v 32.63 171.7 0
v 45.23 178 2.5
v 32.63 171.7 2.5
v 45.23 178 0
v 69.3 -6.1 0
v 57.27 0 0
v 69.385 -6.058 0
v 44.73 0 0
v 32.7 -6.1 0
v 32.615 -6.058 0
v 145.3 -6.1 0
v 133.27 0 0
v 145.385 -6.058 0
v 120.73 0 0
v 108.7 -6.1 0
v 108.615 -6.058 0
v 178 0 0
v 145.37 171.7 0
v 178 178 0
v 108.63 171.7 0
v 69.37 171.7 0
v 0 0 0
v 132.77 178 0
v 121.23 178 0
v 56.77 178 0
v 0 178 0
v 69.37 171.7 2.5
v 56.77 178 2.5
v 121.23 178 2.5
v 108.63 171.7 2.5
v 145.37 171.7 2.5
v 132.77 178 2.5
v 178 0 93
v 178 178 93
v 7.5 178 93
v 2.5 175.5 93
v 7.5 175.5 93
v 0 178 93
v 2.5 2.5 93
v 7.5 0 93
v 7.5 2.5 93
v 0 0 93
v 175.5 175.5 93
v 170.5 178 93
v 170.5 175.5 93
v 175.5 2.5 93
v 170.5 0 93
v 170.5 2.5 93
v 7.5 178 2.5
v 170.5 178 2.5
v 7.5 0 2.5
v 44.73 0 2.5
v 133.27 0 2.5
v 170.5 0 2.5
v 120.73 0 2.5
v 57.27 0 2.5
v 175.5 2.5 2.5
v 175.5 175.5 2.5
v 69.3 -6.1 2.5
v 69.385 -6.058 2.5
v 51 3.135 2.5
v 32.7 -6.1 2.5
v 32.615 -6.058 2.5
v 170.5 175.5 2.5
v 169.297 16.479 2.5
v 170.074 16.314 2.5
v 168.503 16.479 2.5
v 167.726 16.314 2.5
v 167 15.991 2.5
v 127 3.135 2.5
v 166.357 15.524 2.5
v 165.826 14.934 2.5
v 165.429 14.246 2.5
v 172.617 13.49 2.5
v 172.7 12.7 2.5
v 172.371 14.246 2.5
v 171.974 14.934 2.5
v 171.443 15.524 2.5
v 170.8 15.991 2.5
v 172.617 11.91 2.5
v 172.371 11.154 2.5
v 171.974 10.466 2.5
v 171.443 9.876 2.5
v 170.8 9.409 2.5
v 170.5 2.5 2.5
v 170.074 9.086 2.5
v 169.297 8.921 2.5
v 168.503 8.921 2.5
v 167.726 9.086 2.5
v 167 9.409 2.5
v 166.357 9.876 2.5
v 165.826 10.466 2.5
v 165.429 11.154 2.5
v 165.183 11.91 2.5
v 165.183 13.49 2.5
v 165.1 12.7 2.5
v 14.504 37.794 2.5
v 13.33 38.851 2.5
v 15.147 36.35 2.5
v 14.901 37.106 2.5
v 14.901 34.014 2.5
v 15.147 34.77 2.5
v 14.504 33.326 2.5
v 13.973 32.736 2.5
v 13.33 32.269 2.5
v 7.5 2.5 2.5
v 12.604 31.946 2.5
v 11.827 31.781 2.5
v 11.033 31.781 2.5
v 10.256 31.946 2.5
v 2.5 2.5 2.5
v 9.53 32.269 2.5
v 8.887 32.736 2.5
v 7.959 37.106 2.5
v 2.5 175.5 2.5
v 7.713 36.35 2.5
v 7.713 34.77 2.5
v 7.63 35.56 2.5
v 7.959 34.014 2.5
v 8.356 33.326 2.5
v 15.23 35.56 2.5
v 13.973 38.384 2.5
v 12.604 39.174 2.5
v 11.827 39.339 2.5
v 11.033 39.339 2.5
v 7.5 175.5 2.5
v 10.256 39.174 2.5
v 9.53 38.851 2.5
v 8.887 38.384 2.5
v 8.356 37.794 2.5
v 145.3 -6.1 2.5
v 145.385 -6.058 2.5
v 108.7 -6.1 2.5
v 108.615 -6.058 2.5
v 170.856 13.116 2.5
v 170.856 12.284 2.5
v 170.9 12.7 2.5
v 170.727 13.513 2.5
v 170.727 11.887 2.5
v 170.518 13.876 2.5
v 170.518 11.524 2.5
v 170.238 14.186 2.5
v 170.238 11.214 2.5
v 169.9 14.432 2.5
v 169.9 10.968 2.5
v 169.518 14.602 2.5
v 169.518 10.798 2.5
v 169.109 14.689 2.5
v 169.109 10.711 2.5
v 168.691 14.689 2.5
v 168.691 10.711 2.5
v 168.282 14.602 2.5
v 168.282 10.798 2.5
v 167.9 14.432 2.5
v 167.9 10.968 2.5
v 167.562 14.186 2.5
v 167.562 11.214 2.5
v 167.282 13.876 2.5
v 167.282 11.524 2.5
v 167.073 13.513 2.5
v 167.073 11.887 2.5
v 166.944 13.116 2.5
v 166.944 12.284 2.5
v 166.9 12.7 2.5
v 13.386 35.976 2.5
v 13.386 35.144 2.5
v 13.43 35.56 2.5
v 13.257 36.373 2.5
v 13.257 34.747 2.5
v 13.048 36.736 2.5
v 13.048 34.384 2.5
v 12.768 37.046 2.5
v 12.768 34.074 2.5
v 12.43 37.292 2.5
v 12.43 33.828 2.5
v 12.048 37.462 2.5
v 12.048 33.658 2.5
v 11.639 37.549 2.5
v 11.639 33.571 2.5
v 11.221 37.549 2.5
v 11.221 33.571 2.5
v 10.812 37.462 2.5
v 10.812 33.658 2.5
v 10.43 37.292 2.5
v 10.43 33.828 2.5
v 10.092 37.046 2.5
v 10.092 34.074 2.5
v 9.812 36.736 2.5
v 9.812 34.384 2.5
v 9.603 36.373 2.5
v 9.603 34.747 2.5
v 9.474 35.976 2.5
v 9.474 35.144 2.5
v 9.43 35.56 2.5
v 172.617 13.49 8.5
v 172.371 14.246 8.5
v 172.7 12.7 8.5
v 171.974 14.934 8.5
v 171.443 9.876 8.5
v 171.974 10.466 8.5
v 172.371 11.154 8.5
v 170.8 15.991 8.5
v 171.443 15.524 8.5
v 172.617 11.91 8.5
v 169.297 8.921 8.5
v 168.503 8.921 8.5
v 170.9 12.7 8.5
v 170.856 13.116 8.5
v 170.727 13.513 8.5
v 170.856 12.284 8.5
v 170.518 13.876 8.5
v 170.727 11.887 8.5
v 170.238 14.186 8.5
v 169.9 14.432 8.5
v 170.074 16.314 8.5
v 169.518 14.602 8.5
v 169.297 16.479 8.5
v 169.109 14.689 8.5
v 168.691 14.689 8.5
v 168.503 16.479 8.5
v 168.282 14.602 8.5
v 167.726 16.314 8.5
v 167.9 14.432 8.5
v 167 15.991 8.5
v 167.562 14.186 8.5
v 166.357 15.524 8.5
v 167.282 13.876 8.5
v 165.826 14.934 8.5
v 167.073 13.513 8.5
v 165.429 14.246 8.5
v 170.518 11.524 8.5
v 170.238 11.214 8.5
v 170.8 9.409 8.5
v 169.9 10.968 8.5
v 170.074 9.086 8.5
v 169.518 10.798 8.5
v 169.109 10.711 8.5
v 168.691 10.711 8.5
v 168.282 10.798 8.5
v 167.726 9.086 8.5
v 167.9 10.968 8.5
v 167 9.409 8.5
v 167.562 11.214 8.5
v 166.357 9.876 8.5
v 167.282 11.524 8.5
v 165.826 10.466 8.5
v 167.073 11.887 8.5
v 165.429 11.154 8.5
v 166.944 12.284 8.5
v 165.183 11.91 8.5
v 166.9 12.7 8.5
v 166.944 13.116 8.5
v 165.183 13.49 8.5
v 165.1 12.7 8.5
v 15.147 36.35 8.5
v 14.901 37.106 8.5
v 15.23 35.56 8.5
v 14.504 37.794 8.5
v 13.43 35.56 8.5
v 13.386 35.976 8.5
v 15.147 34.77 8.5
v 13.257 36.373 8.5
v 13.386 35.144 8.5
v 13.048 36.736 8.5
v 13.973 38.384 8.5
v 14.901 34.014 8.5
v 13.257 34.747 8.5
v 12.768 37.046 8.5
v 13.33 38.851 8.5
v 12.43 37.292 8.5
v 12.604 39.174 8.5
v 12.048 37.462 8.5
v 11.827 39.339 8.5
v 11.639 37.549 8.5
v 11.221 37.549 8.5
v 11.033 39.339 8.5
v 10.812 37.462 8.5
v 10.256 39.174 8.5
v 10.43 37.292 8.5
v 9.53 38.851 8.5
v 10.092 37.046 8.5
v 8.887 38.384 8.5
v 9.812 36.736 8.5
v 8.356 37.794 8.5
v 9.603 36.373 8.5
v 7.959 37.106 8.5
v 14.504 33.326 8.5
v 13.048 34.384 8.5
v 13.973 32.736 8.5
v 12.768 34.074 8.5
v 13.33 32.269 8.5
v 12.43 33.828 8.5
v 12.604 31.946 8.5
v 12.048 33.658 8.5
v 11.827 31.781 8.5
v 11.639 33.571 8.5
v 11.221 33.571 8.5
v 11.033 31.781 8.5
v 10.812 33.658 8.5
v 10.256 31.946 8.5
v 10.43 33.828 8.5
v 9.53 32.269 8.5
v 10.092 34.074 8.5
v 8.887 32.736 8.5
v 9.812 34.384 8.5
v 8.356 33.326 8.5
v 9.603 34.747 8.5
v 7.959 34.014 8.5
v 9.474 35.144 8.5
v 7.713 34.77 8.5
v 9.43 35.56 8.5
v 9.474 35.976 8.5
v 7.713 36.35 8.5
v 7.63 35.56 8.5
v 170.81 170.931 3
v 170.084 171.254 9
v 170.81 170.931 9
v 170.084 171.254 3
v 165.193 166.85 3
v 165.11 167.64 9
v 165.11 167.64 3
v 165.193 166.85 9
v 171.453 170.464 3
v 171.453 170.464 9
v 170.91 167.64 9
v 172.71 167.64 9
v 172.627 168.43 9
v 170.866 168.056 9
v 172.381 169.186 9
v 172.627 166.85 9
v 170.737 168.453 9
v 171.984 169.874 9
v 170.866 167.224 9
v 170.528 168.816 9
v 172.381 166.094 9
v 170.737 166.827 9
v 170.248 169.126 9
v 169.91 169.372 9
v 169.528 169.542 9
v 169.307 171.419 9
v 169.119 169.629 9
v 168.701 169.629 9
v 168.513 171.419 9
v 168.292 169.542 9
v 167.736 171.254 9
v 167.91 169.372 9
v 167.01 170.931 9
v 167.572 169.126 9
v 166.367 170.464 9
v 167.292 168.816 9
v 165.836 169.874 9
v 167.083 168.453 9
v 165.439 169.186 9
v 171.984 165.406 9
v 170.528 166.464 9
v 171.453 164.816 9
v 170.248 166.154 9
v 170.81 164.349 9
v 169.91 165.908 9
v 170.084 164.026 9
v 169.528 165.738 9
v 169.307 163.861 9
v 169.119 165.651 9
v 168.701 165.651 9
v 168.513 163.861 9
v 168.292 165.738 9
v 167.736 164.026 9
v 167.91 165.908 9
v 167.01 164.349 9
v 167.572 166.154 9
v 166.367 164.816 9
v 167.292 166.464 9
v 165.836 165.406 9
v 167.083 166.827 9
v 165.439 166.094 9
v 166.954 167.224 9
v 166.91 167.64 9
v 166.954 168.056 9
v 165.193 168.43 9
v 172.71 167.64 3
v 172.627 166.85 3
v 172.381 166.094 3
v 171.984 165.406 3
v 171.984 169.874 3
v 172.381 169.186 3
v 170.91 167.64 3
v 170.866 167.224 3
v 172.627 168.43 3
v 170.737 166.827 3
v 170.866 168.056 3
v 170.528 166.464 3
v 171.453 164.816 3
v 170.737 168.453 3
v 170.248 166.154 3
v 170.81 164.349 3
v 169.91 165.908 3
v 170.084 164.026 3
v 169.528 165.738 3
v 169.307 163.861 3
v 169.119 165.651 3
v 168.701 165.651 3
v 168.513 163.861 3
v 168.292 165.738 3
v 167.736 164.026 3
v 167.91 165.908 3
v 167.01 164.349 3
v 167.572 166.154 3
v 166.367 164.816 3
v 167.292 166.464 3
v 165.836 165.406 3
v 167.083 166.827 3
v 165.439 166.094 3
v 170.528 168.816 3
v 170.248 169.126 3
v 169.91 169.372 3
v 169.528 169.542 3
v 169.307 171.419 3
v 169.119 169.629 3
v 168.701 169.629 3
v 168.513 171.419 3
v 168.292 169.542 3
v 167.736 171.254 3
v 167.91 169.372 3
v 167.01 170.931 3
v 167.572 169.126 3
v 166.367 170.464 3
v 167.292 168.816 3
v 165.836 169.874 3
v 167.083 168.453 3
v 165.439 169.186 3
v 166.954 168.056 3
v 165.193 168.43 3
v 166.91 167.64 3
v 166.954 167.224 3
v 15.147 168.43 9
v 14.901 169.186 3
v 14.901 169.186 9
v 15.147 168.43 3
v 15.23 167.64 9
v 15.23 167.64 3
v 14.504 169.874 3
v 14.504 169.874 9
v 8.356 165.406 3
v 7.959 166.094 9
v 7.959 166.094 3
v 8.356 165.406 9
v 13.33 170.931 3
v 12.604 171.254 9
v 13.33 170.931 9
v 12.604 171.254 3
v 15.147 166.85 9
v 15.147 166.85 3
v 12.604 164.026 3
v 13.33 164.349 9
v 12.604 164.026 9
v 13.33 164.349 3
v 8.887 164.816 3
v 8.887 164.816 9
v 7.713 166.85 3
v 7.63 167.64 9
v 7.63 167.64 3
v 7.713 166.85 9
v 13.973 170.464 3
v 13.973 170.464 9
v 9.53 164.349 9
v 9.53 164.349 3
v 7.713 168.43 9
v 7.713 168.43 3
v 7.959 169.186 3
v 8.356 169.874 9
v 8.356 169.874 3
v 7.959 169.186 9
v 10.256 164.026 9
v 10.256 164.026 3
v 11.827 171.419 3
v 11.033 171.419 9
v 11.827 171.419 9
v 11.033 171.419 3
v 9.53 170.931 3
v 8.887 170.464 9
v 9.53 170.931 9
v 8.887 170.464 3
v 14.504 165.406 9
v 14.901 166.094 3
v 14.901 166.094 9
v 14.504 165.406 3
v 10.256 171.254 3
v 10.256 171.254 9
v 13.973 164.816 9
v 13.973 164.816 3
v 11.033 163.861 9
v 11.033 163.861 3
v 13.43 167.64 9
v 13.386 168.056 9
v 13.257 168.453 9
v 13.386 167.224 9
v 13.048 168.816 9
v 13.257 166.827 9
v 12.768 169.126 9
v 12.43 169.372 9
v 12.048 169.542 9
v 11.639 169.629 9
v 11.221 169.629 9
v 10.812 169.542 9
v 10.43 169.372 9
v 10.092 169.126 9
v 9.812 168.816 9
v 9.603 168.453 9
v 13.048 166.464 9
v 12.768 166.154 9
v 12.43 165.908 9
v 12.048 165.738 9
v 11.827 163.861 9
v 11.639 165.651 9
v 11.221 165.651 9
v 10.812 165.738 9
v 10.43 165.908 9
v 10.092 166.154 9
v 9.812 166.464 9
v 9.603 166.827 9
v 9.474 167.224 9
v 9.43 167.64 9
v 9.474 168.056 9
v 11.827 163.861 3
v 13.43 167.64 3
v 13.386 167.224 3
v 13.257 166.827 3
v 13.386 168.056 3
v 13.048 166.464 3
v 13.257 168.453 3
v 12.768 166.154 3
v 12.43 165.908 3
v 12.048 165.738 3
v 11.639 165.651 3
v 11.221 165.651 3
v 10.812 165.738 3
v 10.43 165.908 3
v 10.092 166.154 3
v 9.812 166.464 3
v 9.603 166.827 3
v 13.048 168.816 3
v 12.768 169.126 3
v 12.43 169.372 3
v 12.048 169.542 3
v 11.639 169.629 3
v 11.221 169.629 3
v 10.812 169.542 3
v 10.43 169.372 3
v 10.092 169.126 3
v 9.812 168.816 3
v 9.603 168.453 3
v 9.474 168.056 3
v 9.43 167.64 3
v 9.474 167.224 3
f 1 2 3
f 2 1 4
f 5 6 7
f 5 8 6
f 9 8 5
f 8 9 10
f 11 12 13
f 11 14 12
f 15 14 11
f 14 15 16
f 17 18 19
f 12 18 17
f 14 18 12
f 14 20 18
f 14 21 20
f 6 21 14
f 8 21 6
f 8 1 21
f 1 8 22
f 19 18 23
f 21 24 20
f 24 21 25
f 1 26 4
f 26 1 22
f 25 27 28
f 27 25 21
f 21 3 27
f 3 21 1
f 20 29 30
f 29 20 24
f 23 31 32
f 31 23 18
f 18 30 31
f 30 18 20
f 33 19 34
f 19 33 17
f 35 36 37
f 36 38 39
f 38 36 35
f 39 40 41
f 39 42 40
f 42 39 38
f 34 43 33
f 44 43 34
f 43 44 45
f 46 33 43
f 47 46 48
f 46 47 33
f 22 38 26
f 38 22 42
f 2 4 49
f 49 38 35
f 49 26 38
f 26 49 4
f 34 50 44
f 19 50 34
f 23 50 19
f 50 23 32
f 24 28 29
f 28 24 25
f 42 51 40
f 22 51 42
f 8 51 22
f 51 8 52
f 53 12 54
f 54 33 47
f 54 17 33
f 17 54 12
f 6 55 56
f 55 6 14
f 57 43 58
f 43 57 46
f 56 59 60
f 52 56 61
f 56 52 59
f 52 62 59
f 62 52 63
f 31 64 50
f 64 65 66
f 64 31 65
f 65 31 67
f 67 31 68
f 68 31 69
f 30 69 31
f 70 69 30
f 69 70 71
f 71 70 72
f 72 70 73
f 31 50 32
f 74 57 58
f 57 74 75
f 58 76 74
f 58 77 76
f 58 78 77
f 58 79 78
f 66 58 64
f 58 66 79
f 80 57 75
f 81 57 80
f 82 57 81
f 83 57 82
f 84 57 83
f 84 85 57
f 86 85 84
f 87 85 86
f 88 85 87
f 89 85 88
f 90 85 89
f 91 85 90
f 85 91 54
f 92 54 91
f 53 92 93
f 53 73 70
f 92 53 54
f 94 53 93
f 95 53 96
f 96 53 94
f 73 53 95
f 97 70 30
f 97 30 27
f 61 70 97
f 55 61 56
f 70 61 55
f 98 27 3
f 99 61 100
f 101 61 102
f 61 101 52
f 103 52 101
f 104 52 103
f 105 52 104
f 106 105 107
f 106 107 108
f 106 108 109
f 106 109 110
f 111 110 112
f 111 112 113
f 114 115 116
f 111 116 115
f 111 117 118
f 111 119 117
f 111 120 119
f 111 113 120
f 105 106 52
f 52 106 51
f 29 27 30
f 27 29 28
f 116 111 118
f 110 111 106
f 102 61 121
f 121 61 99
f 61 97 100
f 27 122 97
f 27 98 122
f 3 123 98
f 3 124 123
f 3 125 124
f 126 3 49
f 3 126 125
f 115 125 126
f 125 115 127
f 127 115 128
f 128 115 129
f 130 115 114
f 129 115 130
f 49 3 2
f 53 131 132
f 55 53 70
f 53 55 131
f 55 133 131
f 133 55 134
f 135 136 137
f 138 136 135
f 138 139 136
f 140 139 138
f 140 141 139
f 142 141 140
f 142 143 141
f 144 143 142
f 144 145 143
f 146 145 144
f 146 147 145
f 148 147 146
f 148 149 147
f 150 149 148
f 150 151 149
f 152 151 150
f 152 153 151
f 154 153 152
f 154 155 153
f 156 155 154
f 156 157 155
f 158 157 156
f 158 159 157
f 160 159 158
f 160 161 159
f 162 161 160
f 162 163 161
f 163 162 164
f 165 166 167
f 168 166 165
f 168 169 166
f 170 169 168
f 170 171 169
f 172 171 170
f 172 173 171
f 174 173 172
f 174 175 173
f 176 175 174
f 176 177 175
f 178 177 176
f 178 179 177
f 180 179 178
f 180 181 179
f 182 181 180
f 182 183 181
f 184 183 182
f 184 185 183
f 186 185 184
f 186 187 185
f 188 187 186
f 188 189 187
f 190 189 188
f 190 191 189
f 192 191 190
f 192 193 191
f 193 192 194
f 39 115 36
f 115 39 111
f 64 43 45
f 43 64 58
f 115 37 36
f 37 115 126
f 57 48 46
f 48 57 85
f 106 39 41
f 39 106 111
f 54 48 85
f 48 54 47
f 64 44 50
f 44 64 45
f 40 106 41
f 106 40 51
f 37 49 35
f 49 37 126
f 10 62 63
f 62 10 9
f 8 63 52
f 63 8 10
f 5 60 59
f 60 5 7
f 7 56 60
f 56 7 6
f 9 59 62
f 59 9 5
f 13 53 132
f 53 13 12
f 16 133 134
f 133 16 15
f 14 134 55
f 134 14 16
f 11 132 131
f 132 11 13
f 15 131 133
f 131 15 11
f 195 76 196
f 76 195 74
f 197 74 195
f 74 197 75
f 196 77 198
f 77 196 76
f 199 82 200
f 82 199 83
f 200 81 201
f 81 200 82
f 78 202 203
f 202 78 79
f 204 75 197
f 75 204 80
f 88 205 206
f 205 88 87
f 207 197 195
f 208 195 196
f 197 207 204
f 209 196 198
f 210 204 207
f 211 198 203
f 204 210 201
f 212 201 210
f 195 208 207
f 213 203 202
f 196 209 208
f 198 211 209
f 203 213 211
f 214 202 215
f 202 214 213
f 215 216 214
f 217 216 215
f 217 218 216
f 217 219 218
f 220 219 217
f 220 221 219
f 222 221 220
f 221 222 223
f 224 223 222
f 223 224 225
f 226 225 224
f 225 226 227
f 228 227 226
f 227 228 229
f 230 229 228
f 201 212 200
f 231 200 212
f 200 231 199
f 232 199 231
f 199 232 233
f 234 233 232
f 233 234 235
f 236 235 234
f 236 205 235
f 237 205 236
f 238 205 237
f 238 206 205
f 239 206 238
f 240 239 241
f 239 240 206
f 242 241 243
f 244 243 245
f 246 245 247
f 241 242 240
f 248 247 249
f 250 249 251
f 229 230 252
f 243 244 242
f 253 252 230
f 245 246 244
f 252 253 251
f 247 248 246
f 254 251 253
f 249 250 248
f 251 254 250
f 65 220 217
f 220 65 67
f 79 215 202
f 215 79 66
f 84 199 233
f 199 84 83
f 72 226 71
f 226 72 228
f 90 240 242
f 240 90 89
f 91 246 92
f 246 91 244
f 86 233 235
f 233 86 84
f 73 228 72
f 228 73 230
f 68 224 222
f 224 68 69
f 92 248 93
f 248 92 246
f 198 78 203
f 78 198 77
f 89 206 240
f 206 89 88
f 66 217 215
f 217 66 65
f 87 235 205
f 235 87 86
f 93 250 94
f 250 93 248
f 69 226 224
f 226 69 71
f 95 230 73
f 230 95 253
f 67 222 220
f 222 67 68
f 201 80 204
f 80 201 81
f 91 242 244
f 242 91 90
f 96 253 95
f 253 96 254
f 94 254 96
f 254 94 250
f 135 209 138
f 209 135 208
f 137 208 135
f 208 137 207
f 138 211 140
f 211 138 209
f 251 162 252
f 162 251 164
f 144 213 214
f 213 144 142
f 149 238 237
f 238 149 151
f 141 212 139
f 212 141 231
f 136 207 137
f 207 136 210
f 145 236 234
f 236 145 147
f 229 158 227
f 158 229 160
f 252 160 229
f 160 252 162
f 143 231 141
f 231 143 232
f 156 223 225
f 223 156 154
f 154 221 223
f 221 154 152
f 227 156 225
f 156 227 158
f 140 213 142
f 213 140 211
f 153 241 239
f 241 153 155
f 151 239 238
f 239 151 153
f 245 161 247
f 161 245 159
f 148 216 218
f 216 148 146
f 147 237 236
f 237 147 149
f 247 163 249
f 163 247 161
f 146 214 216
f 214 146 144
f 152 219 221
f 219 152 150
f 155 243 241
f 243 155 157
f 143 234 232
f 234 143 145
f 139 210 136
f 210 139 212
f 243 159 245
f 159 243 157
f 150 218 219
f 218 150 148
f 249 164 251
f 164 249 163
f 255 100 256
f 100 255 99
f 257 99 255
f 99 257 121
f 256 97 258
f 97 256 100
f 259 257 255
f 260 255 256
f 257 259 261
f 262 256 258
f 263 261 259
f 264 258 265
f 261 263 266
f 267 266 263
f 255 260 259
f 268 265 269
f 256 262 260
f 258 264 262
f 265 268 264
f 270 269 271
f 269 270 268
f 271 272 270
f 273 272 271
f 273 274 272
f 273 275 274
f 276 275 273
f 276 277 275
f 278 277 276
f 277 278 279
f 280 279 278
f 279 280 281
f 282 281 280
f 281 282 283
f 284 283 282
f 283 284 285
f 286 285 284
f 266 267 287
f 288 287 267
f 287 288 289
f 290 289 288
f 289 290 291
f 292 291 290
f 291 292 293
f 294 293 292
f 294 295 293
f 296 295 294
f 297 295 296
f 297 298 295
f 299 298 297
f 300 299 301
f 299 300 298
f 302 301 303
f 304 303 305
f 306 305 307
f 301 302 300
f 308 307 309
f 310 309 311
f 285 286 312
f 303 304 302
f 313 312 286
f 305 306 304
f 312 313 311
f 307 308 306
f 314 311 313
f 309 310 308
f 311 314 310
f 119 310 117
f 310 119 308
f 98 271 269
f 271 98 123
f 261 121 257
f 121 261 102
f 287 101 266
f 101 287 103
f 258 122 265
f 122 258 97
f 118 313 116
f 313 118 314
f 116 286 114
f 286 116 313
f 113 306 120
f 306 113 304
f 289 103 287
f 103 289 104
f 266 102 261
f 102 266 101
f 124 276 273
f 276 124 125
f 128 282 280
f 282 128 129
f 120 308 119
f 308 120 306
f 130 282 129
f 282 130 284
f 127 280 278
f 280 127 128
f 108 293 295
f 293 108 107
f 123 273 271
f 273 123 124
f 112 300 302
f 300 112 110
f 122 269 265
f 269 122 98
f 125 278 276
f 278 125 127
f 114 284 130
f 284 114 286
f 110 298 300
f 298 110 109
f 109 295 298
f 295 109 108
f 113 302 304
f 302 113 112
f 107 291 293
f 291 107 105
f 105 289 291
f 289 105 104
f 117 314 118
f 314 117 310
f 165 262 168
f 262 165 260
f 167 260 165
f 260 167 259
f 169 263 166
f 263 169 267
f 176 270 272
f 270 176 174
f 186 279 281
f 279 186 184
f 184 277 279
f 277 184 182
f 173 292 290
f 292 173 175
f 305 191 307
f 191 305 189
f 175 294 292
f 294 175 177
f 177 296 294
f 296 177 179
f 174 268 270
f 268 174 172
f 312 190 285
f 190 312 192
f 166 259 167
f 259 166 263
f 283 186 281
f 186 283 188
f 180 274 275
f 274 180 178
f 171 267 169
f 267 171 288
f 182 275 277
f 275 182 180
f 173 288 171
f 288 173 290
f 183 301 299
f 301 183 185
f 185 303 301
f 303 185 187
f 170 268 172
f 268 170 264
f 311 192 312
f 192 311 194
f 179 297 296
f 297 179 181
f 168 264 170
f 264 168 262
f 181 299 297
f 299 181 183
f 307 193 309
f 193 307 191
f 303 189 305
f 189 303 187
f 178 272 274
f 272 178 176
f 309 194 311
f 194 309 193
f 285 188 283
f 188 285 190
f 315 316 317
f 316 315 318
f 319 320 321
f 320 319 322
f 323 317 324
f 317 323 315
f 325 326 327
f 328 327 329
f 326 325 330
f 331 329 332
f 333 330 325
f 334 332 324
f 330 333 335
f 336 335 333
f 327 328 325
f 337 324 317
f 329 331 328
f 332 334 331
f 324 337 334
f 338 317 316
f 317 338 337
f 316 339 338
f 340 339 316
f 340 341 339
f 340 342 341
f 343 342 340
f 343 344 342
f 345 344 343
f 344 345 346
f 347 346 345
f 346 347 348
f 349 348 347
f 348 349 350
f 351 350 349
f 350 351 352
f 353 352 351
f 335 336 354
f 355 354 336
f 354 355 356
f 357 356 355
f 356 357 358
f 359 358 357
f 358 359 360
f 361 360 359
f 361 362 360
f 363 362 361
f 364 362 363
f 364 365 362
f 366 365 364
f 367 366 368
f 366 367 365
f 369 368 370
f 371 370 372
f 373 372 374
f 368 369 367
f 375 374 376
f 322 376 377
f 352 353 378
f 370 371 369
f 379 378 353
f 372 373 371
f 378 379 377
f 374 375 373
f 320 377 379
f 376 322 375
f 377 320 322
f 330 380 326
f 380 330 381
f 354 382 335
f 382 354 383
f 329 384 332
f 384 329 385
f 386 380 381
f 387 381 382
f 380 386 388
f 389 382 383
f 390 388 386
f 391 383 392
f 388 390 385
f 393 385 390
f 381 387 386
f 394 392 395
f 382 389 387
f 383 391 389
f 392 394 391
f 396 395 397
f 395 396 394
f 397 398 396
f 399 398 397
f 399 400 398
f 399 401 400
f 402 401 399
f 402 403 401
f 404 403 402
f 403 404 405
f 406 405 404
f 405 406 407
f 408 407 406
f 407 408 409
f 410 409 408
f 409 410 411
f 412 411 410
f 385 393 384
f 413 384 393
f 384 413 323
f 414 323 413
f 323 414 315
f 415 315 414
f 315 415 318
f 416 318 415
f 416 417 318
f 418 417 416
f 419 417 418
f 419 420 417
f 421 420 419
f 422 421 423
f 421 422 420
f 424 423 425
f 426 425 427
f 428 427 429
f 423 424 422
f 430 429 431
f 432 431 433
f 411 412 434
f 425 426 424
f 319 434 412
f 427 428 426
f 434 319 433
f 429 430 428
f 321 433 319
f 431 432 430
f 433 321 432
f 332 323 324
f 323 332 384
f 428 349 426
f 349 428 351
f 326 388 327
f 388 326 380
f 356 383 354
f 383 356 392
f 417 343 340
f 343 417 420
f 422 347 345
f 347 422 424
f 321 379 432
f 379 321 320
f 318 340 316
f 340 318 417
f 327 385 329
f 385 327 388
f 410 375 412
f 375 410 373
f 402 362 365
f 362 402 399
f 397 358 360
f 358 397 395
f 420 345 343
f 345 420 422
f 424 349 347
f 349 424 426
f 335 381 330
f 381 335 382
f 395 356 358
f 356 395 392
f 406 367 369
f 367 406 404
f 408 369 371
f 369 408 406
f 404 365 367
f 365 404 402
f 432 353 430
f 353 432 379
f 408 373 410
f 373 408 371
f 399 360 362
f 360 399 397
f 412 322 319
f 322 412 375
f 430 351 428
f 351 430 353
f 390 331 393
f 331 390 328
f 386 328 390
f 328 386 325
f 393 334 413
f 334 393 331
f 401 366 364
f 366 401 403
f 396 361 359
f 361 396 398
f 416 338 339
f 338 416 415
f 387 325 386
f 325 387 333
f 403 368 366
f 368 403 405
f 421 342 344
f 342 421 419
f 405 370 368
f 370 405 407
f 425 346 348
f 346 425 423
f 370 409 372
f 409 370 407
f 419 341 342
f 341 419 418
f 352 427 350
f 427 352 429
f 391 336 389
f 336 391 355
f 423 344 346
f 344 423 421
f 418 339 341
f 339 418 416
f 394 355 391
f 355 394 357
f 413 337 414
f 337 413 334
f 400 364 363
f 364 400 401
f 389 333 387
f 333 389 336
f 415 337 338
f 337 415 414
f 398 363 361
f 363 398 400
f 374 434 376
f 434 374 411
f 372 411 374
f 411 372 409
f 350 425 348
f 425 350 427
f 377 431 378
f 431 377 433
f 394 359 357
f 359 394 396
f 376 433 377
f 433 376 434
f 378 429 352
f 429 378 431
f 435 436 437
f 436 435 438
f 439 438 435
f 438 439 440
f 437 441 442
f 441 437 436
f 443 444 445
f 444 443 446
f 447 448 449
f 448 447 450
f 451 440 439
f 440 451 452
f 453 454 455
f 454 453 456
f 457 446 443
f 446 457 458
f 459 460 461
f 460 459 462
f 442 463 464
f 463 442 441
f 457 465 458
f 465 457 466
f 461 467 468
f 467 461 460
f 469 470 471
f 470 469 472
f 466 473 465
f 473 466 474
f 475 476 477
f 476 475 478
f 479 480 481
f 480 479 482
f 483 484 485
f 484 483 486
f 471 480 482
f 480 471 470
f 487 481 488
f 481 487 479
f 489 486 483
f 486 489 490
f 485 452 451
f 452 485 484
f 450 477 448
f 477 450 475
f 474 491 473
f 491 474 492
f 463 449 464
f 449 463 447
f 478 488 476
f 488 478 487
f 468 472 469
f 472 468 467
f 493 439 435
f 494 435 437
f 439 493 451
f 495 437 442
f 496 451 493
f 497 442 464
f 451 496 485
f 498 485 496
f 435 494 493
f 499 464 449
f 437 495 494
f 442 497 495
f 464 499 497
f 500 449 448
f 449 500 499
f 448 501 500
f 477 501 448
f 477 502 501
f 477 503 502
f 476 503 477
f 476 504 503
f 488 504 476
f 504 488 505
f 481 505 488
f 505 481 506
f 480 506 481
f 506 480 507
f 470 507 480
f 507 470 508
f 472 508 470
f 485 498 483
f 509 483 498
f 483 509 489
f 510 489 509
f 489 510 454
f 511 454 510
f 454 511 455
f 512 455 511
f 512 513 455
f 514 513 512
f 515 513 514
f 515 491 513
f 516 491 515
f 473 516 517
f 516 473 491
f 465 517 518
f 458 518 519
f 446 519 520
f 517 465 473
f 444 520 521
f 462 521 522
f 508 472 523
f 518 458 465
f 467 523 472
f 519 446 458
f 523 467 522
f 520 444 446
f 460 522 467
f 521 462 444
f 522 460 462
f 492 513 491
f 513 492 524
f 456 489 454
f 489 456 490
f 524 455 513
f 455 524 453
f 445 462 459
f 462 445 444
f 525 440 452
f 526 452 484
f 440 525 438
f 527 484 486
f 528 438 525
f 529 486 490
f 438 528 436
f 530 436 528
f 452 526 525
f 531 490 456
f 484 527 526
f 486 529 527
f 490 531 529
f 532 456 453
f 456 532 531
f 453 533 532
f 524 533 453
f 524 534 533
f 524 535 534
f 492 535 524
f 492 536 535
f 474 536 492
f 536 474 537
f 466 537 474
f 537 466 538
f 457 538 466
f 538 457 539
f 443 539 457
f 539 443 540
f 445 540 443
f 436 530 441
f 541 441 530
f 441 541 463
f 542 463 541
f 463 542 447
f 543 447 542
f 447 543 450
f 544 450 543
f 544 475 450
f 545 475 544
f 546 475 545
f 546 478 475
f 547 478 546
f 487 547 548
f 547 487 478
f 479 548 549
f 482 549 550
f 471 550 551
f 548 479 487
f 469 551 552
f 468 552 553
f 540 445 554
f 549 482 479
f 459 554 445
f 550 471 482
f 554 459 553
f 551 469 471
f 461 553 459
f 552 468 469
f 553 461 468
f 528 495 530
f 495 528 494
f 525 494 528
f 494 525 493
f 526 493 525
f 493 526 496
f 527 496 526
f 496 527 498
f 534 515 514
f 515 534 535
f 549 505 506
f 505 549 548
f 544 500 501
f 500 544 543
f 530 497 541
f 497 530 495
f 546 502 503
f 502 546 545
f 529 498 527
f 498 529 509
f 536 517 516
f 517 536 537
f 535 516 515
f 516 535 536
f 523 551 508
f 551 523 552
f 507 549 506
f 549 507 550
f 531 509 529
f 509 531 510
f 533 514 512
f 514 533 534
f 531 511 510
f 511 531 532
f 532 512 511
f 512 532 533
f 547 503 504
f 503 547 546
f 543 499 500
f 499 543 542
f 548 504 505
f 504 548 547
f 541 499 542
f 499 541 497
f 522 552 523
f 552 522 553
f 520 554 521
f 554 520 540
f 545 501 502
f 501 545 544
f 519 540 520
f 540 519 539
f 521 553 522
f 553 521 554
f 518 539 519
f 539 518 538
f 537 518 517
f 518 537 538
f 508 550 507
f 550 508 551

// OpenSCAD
//UNCOMMENT THE DESIRED CONFIGURATION MODULE BELOW

MiniItxScrewMounts();
//FanMount();
//HardDriveHolder();
//HardDriveBase();

//==========================================
// VARIABLES

thickness = 2.5; //mm
opening = 5; //mm

//==========================================

module case(CaseLength) {
	difference(){
		cube([178,CaseLength,93]); //base box

		translate([thickness,thickness,thickness]){
			cube([178-thickness*2,CaseLength - thickness*2,100]);} //cut out box

		translate([thickness+opening,0,thickness]){
			cube([178-thickness*2-opening*2,CaseLength +1,100]);} //cut out box

	//cut out attachment points

	difference(){
		translate([51,CaseLength - 15.5,0]){
			scale([2,1,1]){
				rotate(a=45, v=[0,0,1]){
					cube([13,13,13]);}}}

		translate([31.75,CaseLength - 57.1,0]){
			cube([50.8,50.8,25.4]);}
	}

		difference(){
			translate([127,CaseLength - 15.5,0]){
				scale([2,1,1]){
					rotate(a=45, v=[0,0,1]){
						cube([13,13,13]);}}}

		translate([105,CaseLength - 57.1,0]){
			cube([50.8,50.8,25.4]);}
		}

		//FACEPLATE IO SHIELD
		//translate([.1,0,0.2]){
			//cube([6.2,.2,1.75]);} 

		} //end difference

		//ADD ATTACHMENT TO FRONT

		difference(){
			translate([51,-15.25,0]){
				scale([2,1,1]){
					rotate(a=45, v=[0,0,1]){
						cube([13,13,2.5]);}}}

		translate([31.75,-56.9,0]){
			cube([50.8,50.8,25.4]);}
		}

		difference(){
			translate([127,-15.25,0]){
				scale([2,1,1]){
					rotate(a=45, v=[0,0,1]){
						cube([13,13,2.5]);}}}

		translate([105,-56.9,0]){
			cube([50.8,50.8,25.4]);}
	}
}// END CASE MODULE

//==========================================

module MiniItxScrewMounts(){
CaseLength = 178; //mm
case(CaseLength);

ScrewPlacement1 = [168.9,12.7,2.5];
ScrewPlacement2 = [11.43,35.56,2.5];
ScrewPlacement3 = [168.91,167.64,3];
ScrewPlacement4 = [11.43,167.64,3];

interiorRadius = 2;
exteriorRadius = 3.8;
offset = 6;

for(x=[ScrewPlacement1,ScrewPlacement2,ScrewPlacement3,ScrewPlacement4])
{
	difference(){
		translate(x){
			cylinder(r=exteriorRadius, h=offset, $fs=.1);}
		translate(x){
			cylinder(r=interiorRadius, h=offset, $fs=.1);
	}
}
}

} //END MINIITXSCREWMOUNTS MODULE

//==========================================

module FanMount(){
CaseLength = 40; //mm
case(CaseLength);

//FANS
//translate([6.75,5,2.5]){
//cube([80,25,80]);}

//translate([92,5,2.5]){
//cube([80,25,80]);}

Mount1 = [6.75,2.5,2.5];
Mount2 = [92,2.5,2.5];
Mount3 = [6.75+80-8.6,2.5,2.5];
Mount4 = [92+80-8.6,2.5,2.5];
Mount5 = [6.75,2.5+25+3,2.5];
Mount6 = [92,2.5+25+3,2.5];
Mount7 = [6.75+80-8.6,2.5+25+3,2.5];
Mount8 = [92+80-8.6,2.5+25+3,2.5];

interiorRadius = 2.3;
exteriorWidth = 8.6;
offset = [4.3,0,4.3];

for(x=[Mount1,Mount2,Mount3,Mount4,Mount5,Mount6,Mount7,Mount8])
{
	difference(){
		translate(x){
			cube([exteriorWidth,3,exteriorWidth]);}

		translate(x+offset){
			rotate([-90,0,0]){
				cylinder(h=3.2, r=interiorRadius, $fs=.1);}}
	} // End Diff
}

} //END FANMOUNT MODULE

//==========================================

module HardDriveHolder(){

CaseLength = 115; //mm

difference(){
	case(CaseLength);
	HardDrives();
}

BaseOffset = 25;

Stack1 = [thickness+BaseOffset-5, thickness, thickness];
Stack2 = [thickness+BaseOffset+146-13, thickness, thickness];
Stack3 = [thickness+BaseOffset-5, thickness+97, thickness];
Stack4 = [thickness+BaseOffset+146-13, thickness+97, thickness];
Stack5 = [thickness+BaseOffset+60, thickness, thickness];
Stack6 = [thickness+BaseOffset+60, thickness+97, thickness];

for(x=[Stack1,Stack2,Stack3,Stack4,Stack5,Stack6])
{
difference(){
	translate(x){
cube([15,10,93-thickness]);}
	HardDrives();}
}

} //END HARDDRIVEHOLDER MODULE

//==========================================

module HardDrives(){

BaseOffset = 25;

	translate([thickness+BaseOffset,thickness*2,thickness+3]){
cube([146+20,102,26]);}

translate([thickness+BaseOffset,thickness*2,thickness+26+3*2]){
cube([146+20,102,26]);}

translate([thickness+BaseOffset,thickness*2,thickness+26*2+3*3]){
cube([146+20,102,26]);}
}

//==========================================

module HardDriveBase(){

difference(){

	cube([93-thickness,115,40]);

	translate([3,thickness*2,25]){
		cube([26,102,50]);}

	translate([3*2+26,thickness*2,25]){
		cube([26,102,50]);}

	translate([3*3+26*2,thickness*2,25]){
		cube([26,102,50]);}

	translate([2,thickness*2+9,0]){
		cube([27,40,26]);}

	translate([2+26+3,thickness*2+9,0]){
		cube([27,40,26]);}

	translate([2+26*2+3*2,thickness*2+9,0]){
		cube([27,40,26]);}

} //EndDiff

} //	END HARDDRIVEBASE MODULE

//==========================================
